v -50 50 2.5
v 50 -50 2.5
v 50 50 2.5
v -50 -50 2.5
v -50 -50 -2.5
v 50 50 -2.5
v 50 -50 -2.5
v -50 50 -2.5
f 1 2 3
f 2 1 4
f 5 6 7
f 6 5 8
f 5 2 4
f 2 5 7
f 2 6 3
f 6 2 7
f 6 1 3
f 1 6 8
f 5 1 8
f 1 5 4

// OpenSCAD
module XYCalibration()
{
	cube([100, 100, 5], center = true);
}

XYCalibration();
